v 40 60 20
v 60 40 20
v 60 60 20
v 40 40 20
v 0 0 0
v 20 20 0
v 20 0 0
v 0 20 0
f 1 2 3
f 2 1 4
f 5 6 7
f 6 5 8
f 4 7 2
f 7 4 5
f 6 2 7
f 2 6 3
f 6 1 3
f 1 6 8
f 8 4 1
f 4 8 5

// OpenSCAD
multmatrix(m = [[1, 0, 2, 0],
                [0, 1, 2, 0],
				[0, 0, 1, 0],
				[0, 0, 0, 1]]) {
	cube([20, 20, 20]);
}
